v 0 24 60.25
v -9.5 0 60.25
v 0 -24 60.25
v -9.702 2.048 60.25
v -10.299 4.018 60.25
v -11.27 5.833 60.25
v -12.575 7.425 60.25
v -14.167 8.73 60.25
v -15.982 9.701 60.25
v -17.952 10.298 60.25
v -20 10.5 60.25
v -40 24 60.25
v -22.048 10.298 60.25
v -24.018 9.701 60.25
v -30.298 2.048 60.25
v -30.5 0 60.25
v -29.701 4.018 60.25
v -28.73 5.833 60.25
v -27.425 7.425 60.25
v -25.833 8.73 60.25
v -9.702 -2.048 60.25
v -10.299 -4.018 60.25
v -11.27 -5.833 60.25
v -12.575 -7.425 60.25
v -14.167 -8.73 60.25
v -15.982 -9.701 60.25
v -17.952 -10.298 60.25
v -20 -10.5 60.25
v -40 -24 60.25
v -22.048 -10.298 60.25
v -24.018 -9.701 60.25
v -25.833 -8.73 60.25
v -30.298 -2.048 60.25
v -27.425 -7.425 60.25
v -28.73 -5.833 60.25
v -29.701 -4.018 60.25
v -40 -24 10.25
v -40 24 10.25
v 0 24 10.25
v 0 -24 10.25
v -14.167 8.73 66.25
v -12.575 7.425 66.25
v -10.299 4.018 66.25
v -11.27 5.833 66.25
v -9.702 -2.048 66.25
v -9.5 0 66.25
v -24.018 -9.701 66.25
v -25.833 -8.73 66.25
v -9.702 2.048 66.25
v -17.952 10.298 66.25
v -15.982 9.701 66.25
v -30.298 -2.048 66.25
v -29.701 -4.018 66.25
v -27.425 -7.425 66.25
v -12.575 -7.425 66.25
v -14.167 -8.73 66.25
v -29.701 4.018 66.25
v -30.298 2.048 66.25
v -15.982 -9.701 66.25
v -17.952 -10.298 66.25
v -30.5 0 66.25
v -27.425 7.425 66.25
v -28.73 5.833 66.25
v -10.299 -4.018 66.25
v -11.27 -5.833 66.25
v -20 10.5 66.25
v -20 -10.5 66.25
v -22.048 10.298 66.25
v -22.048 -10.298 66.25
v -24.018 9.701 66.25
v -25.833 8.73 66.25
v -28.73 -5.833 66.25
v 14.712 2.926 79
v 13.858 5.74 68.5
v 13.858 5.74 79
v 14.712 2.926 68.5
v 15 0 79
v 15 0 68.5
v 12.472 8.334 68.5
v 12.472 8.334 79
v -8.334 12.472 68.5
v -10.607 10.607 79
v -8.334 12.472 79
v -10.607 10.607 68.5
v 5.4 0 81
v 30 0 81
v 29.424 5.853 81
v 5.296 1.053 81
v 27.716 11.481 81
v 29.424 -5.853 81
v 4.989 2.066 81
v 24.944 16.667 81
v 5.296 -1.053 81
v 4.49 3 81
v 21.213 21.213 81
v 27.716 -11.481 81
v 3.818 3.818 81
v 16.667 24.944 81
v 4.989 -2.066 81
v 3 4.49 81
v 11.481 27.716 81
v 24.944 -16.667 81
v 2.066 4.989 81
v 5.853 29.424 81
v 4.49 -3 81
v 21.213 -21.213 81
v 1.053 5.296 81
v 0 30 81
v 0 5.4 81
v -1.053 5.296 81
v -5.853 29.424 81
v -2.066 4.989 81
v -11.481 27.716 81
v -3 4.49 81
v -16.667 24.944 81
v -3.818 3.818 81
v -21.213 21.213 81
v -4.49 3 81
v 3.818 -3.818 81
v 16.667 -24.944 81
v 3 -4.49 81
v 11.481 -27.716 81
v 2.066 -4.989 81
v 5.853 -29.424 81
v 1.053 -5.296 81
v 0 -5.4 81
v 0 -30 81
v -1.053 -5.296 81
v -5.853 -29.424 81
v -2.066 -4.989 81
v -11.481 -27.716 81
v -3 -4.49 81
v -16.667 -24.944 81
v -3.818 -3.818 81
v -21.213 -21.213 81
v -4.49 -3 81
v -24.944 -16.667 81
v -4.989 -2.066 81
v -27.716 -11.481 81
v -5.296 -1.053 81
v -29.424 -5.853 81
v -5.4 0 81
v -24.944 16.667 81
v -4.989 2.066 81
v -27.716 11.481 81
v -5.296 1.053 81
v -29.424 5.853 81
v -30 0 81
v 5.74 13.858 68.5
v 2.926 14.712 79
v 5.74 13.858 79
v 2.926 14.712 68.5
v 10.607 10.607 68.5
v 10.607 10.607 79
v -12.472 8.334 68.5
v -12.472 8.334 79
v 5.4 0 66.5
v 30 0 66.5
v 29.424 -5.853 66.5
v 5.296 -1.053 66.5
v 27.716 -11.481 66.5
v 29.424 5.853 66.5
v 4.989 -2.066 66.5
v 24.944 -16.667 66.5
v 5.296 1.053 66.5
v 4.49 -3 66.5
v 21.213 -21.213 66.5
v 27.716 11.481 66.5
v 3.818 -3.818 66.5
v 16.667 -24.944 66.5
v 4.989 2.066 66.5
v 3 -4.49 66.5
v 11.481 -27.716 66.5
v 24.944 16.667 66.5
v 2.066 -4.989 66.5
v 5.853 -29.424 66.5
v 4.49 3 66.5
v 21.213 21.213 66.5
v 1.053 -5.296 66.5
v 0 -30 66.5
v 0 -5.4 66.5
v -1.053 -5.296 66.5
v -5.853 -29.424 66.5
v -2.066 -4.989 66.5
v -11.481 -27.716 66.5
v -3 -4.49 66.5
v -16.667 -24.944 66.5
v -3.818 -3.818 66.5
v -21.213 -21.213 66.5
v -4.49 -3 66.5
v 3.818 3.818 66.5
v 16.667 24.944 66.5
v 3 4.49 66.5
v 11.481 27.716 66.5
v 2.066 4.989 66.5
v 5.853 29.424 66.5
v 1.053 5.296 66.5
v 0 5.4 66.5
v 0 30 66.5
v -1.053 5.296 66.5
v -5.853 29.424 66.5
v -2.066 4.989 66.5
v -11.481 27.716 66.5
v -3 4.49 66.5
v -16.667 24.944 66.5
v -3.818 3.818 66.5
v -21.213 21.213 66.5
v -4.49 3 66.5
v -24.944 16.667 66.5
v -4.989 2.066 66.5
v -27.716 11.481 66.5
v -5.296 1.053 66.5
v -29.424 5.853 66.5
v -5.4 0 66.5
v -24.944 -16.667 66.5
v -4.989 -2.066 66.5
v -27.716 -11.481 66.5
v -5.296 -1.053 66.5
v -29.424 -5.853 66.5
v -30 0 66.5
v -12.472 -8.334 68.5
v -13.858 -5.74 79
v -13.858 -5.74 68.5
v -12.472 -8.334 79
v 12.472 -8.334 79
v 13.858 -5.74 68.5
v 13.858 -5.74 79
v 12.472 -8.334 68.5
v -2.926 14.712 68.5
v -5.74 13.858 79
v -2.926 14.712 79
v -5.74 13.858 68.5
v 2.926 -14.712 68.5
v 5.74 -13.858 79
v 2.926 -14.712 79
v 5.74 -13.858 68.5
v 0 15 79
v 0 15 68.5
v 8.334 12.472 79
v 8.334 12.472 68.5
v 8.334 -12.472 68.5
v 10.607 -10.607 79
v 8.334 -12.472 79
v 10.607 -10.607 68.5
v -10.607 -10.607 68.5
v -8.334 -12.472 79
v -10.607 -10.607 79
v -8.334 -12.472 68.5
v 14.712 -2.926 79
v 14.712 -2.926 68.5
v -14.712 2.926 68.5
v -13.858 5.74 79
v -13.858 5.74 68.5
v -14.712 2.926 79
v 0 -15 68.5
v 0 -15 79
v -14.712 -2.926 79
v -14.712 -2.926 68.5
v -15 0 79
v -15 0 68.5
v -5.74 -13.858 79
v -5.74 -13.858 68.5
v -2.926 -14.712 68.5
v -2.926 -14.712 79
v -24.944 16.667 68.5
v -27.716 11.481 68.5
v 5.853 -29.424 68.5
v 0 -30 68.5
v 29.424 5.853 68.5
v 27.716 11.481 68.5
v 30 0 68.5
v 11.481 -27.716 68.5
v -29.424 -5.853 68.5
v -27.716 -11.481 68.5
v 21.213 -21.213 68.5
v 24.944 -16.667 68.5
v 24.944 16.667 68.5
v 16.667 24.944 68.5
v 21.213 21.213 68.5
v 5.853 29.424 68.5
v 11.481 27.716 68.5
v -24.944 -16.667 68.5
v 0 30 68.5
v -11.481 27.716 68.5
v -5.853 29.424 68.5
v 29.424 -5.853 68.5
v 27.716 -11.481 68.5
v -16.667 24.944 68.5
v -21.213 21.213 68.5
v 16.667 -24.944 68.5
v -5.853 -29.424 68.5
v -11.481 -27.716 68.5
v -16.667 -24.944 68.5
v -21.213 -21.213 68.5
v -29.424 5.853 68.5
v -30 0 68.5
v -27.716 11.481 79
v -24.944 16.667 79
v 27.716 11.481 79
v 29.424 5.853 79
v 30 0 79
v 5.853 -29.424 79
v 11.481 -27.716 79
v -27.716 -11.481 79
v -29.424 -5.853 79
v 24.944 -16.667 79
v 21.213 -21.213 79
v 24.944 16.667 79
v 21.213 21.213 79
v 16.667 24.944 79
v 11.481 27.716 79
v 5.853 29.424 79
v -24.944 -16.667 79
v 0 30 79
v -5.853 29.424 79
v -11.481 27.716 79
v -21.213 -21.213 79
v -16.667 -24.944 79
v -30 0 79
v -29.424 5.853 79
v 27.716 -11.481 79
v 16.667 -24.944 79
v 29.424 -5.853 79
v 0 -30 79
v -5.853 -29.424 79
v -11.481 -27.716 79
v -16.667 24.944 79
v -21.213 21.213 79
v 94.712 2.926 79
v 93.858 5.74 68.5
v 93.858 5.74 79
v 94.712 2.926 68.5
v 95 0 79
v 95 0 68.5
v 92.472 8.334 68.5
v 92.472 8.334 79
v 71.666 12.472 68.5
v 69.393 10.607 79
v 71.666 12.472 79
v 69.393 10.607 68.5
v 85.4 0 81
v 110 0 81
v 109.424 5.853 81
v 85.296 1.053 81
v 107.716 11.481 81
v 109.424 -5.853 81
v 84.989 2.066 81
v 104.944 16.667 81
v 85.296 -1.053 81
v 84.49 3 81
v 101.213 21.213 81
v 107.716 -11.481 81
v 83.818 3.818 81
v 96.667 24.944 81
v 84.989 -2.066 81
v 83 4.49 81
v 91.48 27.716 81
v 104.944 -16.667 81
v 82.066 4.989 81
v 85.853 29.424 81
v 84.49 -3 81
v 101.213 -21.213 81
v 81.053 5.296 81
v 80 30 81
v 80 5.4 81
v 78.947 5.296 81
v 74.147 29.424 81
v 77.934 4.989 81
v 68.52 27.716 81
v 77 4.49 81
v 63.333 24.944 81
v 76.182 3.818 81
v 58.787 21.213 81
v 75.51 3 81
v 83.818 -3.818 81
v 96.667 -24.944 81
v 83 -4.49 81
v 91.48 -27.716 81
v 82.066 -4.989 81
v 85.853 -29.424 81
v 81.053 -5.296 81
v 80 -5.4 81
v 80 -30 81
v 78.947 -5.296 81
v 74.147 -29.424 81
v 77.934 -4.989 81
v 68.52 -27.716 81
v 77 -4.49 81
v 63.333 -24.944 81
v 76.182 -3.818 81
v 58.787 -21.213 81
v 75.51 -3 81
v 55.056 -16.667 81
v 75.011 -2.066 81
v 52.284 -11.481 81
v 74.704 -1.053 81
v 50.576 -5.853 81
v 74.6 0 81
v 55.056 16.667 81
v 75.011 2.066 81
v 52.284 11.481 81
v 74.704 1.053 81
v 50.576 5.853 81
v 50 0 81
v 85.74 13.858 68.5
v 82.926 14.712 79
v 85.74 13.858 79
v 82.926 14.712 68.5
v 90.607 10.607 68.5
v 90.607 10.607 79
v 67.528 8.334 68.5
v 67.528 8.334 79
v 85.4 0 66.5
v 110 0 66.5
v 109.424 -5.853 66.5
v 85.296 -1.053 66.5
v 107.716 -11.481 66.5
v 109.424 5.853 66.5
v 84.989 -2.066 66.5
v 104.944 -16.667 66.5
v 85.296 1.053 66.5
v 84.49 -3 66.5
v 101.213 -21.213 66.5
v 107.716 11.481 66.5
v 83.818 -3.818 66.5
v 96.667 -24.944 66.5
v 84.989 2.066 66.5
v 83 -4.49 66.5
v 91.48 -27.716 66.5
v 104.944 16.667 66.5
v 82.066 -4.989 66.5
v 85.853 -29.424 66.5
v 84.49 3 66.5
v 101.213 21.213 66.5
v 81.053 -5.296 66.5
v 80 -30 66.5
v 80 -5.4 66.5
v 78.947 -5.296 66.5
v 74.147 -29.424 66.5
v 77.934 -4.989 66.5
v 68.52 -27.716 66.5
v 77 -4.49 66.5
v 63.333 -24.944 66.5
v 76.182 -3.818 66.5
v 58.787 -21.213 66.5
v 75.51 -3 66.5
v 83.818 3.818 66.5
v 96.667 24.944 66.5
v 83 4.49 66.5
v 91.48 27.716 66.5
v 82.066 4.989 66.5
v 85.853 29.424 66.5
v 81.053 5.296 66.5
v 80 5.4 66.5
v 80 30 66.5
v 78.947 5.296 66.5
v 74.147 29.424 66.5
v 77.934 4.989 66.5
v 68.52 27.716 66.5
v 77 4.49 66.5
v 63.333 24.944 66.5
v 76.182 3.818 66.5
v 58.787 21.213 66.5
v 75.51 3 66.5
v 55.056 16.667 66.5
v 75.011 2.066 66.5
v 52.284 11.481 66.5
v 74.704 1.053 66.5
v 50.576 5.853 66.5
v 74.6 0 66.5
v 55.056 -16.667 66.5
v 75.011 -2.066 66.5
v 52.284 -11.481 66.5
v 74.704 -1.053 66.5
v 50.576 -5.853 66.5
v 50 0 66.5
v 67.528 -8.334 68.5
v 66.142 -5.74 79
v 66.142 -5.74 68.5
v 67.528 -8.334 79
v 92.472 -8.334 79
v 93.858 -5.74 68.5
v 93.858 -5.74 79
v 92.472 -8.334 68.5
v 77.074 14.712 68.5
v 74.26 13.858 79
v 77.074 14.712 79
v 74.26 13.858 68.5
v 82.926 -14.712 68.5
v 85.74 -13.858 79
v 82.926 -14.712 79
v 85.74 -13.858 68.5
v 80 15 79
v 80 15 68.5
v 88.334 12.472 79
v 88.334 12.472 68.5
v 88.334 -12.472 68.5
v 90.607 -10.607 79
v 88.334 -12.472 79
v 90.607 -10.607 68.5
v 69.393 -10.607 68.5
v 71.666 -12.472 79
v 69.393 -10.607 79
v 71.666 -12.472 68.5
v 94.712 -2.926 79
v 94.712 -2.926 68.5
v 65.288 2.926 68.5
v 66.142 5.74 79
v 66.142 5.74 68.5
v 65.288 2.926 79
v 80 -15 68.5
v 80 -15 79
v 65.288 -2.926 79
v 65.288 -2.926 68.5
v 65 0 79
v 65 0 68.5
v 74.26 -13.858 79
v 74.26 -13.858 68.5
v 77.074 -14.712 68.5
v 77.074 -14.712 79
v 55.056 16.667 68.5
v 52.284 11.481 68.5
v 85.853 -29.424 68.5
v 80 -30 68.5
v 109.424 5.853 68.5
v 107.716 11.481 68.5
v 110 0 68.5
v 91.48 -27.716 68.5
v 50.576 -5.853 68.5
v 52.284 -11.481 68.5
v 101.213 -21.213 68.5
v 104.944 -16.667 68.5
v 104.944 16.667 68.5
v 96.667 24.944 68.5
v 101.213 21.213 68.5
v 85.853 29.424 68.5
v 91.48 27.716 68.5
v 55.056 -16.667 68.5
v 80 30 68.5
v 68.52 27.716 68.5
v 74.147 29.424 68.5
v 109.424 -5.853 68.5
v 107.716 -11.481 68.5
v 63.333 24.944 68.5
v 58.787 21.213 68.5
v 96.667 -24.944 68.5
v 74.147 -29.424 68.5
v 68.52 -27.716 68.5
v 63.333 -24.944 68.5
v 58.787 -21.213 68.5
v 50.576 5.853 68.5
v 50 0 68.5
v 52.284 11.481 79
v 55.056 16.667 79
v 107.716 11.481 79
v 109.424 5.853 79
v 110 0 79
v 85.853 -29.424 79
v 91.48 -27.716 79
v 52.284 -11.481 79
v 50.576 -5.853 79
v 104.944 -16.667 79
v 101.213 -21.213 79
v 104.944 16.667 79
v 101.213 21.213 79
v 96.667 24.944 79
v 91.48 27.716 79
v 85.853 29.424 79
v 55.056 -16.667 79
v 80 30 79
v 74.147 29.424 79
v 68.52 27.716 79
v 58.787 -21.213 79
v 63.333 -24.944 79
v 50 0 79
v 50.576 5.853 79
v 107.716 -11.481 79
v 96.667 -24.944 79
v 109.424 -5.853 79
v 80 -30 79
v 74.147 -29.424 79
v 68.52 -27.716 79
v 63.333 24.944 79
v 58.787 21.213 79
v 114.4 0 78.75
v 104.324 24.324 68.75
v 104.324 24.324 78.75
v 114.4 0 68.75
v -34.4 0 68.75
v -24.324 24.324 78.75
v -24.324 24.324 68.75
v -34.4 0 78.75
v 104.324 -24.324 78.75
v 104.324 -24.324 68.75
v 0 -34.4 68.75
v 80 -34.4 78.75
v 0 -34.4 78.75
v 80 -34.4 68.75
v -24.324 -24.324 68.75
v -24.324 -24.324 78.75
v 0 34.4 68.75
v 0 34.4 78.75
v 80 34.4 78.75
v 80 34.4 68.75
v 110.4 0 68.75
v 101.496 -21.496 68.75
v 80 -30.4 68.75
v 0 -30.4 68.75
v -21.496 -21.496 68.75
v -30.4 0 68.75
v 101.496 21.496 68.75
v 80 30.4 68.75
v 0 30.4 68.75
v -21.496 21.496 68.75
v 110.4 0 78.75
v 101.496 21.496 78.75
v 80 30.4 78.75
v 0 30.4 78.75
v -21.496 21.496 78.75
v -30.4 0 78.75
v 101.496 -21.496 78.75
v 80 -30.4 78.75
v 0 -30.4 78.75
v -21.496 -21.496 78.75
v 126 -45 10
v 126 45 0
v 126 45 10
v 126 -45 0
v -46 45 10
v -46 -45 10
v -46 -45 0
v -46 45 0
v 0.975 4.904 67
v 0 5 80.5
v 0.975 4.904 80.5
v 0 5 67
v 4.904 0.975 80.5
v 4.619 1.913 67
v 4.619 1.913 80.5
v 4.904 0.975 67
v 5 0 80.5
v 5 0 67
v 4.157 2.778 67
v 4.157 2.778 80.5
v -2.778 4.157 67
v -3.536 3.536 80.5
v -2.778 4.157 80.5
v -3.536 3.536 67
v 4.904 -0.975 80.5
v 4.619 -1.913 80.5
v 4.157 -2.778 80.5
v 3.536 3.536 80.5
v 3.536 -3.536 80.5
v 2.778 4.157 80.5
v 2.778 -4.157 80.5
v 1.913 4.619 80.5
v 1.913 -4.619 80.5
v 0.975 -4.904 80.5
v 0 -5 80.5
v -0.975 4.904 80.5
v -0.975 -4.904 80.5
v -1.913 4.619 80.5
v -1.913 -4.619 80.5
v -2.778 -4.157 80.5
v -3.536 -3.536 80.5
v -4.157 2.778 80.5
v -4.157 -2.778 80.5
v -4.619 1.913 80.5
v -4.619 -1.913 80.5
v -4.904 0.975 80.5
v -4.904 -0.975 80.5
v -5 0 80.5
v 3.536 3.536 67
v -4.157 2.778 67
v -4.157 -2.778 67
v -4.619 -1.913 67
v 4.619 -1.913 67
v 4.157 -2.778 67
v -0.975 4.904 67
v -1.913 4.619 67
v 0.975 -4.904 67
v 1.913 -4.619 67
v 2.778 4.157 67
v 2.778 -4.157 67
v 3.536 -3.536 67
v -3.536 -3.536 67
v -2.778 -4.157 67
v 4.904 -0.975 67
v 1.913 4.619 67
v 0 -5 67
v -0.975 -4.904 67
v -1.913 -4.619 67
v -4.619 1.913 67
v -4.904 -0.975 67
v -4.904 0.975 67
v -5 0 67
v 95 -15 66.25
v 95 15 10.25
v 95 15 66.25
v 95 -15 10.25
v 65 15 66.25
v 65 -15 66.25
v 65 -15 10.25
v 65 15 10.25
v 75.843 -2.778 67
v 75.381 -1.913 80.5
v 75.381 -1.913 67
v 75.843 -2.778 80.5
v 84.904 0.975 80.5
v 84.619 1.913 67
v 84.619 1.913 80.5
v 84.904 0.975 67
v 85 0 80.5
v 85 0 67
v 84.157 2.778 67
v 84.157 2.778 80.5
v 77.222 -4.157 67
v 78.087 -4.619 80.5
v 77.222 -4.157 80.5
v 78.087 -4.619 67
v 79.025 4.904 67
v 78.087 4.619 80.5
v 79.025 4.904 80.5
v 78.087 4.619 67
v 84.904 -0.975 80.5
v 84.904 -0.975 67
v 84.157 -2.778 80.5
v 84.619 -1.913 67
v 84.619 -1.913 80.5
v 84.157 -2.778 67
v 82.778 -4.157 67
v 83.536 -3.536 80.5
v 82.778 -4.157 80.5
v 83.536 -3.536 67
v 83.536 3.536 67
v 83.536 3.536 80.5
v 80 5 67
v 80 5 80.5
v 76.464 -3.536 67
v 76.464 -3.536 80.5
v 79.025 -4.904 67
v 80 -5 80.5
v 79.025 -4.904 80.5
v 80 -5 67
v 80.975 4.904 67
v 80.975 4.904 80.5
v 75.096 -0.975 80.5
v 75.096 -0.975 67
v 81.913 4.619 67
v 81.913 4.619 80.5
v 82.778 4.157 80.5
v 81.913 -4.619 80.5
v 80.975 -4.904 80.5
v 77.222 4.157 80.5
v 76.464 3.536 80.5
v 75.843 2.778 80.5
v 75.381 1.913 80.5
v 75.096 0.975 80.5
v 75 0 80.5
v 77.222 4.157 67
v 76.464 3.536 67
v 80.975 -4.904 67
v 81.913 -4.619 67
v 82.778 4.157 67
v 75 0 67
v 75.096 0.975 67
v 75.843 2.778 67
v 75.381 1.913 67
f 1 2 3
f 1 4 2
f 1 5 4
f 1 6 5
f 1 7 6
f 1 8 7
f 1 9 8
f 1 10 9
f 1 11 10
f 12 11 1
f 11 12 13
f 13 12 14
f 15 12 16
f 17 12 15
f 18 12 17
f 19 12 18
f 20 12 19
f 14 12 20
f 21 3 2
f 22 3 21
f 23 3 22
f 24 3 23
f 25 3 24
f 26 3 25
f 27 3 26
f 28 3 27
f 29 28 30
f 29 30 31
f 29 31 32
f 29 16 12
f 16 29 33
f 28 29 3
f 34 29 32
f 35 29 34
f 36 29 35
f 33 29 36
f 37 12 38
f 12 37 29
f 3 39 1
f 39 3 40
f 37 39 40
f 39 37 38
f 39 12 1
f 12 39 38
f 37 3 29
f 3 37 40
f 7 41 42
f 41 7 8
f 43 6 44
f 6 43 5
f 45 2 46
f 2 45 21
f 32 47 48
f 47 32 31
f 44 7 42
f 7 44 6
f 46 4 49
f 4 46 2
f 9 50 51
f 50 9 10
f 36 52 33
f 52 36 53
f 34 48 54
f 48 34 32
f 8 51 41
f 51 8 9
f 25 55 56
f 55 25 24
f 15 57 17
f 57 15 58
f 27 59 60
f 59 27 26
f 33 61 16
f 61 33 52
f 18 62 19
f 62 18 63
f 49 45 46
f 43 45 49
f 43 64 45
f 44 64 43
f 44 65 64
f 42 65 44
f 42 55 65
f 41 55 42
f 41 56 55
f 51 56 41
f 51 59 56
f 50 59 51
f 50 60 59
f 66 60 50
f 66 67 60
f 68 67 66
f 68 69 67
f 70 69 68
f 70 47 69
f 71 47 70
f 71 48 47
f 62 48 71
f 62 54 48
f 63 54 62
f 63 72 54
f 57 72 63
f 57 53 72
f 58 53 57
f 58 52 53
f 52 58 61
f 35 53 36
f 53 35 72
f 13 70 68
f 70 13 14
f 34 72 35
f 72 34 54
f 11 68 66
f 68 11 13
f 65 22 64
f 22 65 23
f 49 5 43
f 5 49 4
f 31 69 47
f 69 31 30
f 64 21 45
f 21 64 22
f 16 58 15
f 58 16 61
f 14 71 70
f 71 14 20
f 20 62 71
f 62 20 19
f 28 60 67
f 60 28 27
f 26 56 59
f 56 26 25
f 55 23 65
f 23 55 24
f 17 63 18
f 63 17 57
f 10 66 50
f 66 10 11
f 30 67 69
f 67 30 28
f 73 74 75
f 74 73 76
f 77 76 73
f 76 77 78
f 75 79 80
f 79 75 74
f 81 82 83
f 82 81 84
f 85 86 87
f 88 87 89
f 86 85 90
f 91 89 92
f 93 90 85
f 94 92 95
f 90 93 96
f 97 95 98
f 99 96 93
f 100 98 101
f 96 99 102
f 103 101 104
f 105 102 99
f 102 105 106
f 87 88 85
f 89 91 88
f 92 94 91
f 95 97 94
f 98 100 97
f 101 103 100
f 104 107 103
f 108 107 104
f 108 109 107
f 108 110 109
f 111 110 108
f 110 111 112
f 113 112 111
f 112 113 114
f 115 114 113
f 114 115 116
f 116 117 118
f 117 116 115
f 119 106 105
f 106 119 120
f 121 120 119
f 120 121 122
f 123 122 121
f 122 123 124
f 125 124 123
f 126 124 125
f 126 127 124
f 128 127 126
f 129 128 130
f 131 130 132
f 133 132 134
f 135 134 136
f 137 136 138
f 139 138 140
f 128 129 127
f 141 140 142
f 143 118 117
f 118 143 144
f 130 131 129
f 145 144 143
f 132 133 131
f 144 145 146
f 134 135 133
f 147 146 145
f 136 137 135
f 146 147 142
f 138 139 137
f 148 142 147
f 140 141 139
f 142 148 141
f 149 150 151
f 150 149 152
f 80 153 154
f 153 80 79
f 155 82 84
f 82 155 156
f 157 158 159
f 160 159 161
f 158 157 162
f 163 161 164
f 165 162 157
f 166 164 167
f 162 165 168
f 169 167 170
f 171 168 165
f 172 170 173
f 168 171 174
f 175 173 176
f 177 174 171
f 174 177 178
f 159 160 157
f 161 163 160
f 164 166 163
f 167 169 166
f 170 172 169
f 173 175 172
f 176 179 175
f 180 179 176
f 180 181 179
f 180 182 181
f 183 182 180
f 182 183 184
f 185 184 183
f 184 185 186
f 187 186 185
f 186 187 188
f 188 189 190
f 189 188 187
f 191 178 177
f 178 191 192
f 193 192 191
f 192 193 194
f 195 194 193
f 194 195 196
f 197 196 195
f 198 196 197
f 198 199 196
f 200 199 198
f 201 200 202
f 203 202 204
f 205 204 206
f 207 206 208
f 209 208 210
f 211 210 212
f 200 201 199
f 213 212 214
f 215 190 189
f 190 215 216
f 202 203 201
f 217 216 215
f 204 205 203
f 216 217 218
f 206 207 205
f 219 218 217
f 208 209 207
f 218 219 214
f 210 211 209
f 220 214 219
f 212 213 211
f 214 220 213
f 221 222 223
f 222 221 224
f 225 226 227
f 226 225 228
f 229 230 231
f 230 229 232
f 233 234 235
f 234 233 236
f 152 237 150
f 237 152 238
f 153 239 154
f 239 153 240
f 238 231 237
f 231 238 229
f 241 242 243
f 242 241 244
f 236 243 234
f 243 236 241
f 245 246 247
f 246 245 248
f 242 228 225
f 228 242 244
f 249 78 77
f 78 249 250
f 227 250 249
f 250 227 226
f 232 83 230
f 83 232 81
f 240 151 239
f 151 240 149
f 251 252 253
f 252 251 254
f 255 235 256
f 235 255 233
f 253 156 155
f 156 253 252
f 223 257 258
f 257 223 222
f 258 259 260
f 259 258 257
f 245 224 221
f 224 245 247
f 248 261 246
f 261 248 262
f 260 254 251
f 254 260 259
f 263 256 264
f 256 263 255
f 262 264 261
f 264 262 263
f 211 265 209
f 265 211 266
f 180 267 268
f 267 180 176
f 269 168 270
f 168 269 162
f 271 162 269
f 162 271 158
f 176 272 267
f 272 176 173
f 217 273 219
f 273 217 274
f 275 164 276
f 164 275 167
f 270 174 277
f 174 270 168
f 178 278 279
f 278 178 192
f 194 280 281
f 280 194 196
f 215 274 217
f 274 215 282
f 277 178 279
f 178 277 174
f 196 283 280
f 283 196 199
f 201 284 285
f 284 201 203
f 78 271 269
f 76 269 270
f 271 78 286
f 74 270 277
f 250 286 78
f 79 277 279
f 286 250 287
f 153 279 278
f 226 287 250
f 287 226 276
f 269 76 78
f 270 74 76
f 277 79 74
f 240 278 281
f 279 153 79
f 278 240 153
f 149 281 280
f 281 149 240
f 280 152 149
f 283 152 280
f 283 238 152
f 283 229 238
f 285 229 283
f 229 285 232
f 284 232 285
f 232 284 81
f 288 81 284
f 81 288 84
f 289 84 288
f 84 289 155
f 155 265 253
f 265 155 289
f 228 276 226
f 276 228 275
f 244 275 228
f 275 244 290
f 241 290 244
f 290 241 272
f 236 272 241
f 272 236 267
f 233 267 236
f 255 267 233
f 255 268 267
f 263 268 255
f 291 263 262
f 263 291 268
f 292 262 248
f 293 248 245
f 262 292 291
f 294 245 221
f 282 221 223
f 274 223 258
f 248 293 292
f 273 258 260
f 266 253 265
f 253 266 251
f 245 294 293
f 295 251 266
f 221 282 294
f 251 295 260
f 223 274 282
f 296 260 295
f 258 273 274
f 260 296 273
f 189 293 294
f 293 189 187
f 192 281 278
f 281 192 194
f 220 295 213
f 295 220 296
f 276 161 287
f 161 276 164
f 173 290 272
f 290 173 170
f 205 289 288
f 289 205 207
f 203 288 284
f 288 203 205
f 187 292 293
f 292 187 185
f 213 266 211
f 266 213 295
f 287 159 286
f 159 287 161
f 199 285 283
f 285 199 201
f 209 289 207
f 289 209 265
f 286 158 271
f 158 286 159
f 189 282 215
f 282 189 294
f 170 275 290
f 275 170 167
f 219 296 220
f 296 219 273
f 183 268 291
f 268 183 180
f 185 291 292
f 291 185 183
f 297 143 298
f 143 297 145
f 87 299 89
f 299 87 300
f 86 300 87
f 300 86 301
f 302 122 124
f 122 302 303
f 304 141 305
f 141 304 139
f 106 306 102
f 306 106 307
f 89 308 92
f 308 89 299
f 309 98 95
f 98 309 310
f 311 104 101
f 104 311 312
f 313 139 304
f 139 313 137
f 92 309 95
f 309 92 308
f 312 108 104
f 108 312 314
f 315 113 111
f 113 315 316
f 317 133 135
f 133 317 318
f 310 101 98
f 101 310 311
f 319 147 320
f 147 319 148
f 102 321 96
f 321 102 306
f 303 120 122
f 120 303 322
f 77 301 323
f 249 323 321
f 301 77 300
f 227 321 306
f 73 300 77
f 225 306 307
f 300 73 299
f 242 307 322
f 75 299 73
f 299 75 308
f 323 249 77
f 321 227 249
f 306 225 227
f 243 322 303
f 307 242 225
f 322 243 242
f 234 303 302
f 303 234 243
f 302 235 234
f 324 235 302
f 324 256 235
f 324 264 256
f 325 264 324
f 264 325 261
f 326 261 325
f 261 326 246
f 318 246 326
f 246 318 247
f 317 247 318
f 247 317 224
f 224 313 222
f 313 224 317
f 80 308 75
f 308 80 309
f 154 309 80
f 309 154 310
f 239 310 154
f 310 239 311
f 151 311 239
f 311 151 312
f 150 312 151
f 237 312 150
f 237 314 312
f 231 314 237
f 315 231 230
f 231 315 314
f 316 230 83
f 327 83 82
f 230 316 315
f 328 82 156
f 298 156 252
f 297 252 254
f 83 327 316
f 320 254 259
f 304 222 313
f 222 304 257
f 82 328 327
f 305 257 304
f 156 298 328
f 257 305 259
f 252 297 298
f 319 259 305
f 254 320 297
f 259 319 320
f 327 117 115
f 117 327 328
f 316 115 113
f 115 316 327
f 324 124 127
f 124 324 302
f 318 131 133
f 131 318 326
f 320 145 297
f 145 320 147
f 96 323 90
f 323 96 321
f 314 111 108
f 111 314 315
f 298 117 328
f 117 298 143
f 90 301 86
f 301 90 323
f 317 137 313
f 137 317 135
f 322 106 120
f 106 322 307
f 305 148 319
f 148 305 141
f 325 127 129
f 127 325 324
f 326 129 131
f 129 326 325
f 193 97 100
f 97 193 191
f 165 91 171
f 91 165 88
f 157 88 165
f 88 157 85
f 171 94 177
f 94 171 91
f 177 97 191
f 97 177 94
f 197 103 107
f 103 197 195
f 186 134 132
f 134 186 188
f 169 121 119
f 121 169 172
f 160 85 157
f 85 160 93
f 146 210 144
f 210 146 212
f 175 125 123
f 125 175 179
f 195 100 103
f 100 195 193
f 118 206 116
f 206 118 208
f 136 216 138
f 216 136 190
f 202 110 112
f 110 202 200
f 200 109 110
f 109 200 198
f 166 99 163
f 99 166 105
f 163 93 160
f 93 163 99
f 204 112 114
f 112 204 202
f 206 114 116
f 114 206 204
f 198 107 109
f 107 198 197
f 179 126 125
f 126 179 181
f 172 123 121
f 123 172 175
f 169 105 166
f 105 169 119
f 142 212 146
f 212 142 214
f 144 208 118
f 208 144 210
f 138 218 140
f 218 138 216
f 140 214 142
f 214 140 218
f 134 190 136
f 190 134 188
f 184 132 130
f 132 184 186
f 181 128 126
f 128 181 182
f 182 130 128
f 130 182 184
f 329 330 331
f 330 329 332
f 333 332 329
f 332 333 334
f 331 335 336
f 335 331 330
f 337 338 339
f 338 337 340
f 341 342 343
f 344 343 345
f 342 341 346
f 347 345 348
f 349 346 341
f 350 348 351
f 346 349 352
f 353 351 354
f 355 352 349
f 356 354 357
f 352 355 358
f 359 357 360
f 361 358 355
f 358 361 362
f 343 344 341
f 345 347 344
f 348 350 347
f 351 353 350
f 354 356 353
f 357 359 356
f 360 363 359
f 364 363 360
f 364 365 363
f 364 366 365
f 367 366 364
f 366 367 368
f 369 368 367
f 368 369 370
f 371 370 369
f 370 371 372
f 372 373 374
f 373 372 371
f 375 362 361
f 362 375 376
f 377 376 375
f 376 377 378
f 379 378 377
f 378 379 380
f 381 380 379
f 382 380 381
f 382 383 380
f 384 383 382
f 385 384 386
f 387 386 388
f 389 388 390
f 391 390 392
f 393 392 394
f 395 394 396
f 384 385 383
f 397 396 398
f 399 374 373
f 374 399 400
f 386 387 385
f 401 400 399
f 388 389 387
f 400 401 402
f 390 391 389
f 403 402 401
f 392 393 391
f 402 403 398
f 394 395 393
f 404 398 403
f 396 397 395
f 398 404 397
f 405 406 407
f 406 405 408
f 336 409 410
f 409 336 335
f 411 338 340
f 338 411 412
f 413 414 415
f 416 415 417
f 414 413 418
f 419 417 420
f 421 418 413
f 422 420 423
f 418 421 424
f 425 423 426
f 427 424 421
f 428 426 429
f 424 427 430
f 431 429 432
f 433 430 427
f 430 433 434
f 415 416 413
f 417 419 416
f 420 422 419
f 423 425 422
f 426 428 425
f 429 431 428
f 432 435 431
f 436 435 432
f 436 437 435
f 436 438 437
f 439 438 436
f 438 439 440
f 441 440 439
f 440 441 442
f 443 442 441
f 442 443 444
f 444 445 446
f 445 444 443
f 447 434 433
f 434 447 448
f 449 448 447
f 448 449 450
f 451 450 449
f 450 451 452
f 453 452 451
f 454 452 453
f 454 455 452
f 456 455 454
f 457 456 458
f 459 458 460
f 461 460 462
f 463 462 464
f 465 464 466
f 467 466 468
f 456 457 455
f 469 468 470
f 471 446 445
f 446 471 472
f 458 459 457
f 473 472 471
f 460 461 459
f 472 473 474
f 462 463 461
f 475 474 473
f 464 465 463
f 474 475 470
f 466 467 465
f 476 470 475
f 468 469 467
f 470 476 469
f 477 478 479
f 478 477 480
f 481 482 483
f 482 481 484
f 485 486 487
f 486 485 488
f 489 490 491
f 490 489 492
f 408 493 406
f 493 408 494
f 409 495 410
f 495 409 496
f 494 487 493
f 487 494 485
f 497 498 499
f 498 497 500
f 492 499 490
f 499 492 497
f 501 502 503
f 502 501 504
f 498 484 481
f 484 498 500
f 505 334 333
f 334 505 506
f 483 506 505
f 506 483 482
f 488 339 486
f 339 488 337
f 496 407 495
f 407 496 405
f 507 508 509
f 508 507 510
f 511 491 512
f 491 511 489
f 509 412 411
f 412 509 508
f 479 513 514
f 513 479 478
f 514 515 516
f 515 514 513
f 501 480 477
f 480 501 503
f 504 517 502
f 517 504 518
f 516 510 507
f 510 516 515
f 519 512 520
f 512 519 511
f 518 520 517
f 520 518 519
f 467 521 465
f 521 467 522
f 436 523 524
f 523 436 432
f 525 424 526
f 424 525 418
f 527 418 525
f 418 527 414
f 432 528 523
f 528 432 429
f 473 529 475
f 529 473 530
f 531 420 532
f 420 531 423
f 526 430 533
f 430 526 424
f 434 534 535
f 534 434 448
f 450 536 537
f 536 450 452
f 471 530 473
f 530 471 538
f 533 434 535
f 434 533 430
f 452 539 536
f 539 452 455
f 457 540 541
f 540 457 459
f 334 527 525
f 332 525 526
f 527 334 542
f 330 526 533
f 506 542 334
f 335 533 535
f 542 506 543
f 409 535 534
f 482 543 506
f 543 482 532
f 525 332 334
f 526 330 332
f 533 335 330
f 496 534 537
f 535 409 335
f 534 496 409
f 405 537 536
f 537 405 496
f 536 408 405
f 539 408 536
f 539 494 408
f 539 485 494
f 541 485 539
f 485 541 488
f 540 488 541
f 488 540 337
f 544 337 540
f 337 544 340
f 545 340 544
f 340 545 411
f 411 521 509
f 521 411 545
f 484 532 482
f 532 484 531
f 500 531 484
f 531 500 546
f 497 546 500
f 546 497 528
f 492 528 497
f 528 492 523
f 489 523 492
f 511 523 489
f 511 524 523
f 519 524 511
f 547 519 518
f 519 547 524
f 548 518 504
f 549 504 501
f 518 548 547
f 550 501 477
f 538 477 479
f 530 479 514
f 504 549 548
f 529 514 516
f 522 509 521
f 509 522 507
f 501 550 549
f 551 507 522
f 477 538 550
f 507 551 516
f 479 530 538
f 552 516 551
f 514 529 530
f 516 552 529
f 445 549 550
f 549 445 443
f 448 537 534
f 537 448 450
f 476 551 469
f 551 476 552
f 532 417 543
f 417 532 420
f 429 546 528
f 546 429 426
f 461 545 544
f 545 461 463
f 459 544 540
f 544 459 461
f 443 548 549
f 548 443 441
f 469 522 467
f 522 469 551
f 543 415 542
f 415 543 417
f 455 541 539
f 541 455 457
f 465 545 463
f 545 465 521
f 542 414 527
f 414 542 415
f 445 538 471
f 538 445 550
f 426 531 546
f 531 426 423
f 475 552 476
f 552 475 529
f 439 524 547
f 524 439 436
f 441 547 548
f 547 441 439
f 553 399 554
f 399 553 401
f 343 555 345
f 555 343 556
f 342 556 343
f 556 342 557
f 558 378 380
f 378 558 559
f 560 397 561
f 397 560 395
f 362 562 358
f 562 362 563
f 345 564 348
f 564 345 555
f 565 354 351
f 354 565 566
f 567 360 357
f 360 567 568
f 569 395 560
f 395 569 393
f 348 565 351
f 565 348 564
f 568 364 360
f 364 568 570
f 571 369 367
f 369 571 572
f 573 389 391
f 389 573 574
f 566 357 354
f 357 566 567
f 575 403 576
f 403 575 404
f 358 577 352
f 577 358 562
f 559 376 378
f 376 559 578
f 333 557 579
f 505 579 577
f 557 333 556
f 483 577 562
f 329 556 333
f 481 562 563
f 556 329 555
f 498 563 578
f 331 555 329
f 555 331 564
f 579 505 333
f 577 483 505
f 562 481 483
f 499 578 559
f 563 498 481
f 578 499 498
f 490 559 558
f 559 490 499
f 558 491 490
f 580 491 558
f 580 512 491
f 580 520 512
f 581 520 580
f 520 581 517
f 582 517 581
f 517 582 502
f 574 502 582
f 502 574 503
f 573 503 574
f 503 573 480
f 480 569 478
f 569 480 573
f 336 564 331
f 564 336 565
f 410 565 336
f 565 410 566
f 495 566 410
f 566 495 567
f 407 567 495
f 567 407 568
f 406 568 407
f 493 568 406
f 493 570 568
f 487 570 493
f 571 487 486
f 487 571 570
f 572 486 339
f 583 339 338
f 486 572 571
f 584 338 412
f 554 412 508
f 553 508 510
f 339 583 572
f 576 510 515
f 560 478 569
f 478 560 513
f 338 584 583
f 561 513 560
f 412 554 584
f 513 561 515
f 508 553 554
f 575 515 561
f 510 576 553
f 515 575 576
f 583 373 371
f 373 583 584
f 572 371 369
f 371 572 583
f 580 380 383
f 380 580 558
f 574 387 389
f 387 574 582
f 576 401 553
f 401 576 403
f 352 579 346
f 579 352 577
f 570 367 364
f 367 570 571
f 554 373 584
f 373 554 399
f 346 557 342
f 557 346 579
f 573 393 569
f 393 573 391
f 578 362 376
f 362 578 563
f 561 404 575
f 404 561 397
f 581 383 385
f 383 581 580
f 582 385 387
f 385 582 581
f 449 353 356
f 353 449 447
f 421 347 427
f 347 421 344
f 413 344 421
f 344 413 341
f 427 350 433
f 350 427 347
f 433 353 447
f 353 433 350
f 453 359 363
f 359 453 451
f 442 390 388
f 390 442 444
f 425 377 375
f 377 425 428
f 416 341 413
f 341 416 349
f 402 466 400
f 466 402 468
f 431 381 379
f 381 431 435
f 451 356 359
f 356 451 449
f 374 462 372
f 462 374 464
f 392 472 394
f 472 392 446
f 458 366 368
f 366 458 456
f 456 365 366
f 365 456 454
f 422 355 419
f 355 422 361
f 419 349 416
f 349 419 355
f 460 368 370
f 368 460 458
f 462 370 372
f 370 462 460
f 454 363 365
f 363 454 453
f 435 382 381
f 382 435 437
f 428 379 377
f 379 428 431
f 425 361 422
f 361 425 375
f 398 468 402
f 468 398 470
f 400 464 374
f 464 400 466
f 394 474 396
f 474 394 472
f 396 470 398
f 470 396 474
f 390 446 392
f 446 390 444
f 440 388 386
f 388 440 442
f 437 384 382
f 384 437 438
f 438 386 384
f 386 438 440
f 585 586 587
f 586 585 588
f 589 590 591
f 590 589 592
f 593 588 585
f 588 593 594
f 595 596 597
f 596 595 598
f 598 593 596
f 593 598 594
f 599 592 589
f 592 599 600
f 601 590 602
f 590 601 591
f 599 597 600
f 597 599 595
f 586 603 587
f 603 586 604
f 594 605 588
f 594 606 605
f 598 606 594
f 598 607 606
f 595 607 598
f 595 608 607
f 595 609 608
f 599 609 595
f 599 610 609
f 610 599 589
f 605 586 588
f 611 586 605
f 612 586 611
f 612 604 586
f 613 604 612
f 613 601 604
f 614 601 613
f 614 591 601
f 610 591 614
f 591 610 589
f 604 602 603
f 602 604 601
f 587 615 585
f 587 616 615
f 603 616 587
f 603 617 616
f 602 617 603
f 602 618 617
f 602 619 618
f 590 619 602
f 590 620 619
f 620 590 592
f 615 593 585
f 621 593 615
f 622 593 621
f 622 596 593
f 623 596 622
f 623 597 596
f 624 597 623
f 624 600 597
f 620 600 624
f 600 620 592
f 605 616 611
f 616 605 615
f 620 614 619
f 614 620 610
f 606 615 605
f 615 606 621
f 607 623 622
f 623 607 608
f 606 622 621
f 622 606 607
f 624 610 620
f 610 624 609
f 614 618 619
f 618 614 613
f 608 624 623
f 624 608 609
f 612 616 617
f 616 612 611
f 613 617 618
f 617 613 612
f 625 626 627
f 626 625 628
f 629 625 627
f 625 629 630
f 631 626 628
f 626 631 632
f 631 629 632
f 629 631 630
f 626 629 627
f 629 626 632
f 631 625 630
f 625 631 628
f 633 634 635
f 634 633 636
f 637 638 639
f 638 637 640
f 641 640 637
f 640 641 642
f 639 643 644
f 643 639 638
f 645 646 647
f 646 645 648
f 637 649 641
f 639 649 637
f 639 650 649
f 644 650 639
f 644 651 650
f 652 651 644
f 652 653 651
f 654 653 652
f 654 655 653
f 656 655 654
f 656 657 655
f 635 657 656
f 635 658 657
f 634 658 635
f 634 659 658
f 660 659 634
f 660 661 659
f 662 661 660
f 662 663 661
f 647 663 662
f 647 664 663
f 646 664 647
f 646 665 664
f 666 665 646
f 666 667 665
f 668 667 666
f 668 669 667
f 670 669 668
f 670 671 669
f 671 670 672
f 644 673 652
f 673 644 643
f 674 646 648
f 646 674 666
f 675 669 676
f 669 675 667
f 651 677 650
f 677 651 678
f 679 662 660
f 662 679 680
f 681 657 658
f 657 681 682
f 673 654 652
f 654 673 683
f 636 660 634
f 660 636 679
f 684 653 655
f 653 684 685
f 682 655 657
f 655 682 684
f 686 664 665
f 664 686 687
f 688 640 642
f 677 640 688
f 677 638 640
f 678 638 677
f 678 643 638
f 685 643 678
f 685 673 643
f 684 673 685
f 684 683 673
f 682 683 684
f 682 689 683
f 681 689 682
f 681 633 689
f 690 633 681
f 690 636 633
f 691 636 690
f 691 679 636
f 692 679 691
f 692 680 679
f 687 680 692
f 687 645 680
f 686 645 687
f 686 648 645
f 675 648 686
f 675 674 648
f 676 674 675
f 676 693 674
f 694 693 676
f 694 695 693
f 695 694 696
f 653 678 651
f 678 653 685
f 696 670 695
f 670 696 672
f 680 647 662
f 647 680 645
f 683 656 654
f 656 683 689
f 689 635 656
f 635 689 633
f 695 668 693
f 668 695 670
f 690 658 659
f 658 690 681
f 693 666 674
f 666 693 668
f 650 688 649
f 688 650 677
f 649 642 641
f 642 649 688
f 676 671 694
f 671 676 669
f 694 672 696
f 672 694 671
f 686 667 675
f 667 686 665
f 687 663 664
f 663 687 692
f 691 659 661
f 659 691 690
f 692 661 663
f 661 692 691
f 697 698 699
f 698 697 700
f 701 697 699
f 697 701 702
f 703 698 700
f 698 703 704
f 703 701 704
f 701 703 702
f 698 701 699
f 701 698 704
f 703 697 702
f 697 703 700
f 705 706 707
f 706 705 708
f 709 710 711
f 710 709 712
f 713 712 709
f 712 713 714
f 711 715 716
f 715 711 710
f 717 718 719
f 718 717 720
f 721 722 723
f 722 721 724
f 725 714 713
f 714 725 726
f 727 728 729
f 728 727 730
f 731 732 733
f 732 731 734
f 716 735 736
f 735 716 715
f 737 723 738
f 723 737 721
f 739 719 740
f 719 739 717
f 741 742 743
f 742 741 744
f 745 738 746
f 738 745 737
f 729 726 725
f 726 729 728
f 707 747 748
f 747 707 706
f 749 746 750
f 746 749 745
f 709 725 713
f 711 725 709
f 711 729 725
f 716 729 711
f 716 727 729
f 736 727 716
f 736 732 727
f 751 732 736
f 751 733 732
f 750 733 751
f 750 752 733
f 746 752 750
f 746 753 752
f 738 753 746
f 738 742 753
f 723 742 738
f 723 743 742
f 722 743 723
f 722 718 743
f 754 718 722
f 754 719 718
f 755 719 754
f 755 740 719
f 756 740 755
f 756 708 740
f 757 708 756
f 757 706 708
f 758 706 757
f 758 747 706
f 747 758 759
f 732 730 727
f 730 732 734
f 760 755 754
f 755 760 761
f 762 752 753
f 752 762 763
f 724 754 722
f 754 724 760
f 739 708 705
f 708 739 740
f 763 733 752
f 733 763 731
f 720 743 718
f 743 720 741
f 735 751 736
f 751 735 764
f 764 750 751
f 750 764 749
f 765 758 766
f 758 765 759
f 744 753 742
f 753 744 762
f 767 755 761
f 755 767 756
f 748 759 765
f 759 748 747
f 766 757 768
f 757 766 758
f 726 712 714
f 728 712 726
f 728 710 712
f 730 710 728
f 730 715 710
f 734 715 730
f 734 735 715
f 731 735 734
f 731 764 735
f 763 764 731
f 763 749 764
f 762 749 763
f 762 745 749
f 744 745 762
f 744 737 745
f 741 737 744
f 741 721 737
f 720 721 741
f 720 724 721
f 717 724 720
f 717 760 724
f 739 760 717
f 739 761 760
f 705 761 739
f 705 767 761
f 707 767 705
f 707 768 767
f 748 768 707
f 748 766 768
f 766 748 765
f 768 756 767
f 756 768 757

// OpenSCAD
$fn = 32;

// ------------------------------------------------------------------------
// Motor belt drive: span 80 mm, pulleys d60, belt 10 mm wide
// Every part is its own module, assembly() places every instance.
// ------------------------------------------------------------------------

// --- part 1 ---
module base_plate() {
  difference() {
    translate([-86, -45, 0]) cube([172, 90, 10]);
  }
}

// --- part 2 ---
module motor() {
  union() {
    translate([-25, -24, 0]) cube([50, 48, 40]);
    translate([28, 0, 20]) rotate([0, 90, 0]) cylinder(h = 6, d = 21, center = true);
  }
}

// --- part 3 ---
module drive_shaft() {
  translate([0, 0, -6.75]) cylinder(h = 13.5, d = 10);
}

// --- part 4 ---
module pulley_drive() {
  difference() {
    union() {
      cylinder(h = 14.5, d = 30);
      cylinder(h = 2, d = 60);
      translate([0, 0, 12.5]) cylinder(h = 2, d = 60);
    }
    translate([0, 0, -1]) cylinder(h = 16.5, d = 10.8);
  }
}

// --- part 5 ---
module idler_post() {
  translate([-15, -15, 0]) cube([30, 30, 56]);
}

// --- part 6 ---
module driven_shaft() {
  translate([0, 0, -6.75]) cylinder(h = 13.5, d = 10);
}

// --- part 7 ---
module pulley_driven() {
  difference() {
    union() {
      cylinder(h = 14.5, d = 30);
      cylinder(h = 2, d = 60);
      translate([0, 0, 12.5]) cylinder(h = 2, d = 60);
    }
    translate([0, 0, -1]) cylinder(h = 16.5, d = 10.8);
  }
}

// --- part 8 ---
module drive_belt() {
  difference() {
    linear_extrude(height = 10) polygon(points = concat([for (a = [90 : 45 : 270]) [34.4 * cos(a), 34.4 * sin(a)]], [for (a = [270 : 45 : 450]) [80 + 34.4 * cos(a), 34.4 * sin(a)]]));
    translate([0, 0, -1]) linear_extrude(height = 12) polygon(points = concat([for (a = [90 : 45 : 270]) [30.4 * cos(a), 30.4 * sin(a)]], [for (a = [270 : 45 : 450]) [80 + 30.4 * cos(a), 30.4 * sin(a)]]));
  }
}

// --- assembly ---
module assembly() {
  color([0.80, 0.24, 0.20]) translate([40, 0, 0]) rotate([0, 0, 0]) base_plate();
  color([0.20, 0.45, 0.75]) translate([0, 0, 35.25]) rotate([0, 270, 0]) motor();
  color([0.25, 0.62, 0.32]) translate([0, 0, 73.75]) rotate([0, 0, 0]) drive_shaft();
  color([0.92, 0.70, 0.18]) translate([0, 0, 66.5]) rotate([0, 0, 0]) pulley_drive();
  color([0.58, 0.35, 0.70]) translate([80, 0, 10.25]) rotate([0, 0, 0]) idler_post();
  color([0.16, 0.66, 0.66]) translate([80, 0, 73.75]) rotate([0, 0, 0]) driven_shaft();
  color([0.85, 0.48, 0.18]) translate([80, 0, 66.5]) rotate([0, 0, 0]) pulley_driven();
  color([0.55, 0.60, 0.65]) translate([0, 0, 68.75]) rotate([0, 0, 0]) drive_belt();
}

assembly();
